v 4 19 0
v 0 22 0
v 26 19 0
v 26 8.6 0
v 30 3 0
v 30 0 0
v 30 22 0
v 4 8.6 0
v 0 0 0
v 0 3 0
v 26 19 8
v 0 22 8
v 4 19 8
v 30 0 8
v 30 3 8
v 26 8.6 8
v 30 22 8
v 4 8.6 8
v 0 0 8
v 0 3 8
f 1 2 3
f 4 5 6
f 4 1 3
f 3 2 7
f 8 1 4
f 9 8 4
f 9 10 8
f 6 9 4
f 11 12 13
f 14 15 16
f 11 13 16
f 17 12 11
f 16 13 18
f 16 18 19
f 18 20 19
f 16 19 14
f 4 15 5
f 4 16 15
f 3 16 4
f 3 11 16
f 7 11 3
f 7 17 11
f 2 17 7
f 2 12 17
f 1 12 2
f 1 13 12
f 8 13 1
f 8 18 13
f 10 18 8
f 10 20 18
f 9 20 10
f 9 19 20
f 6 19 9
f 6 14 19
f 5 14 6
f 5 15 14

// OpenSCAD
$fn = 32;

// ----------------------------------------------------------------------
// Key bar: dovetail key, 8 mm thick
// ----------------------------------------------------------------------

// --- parameters (mm) ---
profile_height = 8;       // extrusion height
profile_points = 10;      // points of the closed outline

profile = [[0, 0], [30, 0], [30, 3], [26, 8.6], [26, 19], [30, 22], [0, 22], [4, 19], [4, 8.6], [0, 3]];  // single closed polygon, 10 points, counter clockwise

// --- the one profile operation ---
linear_extrude(height = profile_height) polygon(points = profile);
